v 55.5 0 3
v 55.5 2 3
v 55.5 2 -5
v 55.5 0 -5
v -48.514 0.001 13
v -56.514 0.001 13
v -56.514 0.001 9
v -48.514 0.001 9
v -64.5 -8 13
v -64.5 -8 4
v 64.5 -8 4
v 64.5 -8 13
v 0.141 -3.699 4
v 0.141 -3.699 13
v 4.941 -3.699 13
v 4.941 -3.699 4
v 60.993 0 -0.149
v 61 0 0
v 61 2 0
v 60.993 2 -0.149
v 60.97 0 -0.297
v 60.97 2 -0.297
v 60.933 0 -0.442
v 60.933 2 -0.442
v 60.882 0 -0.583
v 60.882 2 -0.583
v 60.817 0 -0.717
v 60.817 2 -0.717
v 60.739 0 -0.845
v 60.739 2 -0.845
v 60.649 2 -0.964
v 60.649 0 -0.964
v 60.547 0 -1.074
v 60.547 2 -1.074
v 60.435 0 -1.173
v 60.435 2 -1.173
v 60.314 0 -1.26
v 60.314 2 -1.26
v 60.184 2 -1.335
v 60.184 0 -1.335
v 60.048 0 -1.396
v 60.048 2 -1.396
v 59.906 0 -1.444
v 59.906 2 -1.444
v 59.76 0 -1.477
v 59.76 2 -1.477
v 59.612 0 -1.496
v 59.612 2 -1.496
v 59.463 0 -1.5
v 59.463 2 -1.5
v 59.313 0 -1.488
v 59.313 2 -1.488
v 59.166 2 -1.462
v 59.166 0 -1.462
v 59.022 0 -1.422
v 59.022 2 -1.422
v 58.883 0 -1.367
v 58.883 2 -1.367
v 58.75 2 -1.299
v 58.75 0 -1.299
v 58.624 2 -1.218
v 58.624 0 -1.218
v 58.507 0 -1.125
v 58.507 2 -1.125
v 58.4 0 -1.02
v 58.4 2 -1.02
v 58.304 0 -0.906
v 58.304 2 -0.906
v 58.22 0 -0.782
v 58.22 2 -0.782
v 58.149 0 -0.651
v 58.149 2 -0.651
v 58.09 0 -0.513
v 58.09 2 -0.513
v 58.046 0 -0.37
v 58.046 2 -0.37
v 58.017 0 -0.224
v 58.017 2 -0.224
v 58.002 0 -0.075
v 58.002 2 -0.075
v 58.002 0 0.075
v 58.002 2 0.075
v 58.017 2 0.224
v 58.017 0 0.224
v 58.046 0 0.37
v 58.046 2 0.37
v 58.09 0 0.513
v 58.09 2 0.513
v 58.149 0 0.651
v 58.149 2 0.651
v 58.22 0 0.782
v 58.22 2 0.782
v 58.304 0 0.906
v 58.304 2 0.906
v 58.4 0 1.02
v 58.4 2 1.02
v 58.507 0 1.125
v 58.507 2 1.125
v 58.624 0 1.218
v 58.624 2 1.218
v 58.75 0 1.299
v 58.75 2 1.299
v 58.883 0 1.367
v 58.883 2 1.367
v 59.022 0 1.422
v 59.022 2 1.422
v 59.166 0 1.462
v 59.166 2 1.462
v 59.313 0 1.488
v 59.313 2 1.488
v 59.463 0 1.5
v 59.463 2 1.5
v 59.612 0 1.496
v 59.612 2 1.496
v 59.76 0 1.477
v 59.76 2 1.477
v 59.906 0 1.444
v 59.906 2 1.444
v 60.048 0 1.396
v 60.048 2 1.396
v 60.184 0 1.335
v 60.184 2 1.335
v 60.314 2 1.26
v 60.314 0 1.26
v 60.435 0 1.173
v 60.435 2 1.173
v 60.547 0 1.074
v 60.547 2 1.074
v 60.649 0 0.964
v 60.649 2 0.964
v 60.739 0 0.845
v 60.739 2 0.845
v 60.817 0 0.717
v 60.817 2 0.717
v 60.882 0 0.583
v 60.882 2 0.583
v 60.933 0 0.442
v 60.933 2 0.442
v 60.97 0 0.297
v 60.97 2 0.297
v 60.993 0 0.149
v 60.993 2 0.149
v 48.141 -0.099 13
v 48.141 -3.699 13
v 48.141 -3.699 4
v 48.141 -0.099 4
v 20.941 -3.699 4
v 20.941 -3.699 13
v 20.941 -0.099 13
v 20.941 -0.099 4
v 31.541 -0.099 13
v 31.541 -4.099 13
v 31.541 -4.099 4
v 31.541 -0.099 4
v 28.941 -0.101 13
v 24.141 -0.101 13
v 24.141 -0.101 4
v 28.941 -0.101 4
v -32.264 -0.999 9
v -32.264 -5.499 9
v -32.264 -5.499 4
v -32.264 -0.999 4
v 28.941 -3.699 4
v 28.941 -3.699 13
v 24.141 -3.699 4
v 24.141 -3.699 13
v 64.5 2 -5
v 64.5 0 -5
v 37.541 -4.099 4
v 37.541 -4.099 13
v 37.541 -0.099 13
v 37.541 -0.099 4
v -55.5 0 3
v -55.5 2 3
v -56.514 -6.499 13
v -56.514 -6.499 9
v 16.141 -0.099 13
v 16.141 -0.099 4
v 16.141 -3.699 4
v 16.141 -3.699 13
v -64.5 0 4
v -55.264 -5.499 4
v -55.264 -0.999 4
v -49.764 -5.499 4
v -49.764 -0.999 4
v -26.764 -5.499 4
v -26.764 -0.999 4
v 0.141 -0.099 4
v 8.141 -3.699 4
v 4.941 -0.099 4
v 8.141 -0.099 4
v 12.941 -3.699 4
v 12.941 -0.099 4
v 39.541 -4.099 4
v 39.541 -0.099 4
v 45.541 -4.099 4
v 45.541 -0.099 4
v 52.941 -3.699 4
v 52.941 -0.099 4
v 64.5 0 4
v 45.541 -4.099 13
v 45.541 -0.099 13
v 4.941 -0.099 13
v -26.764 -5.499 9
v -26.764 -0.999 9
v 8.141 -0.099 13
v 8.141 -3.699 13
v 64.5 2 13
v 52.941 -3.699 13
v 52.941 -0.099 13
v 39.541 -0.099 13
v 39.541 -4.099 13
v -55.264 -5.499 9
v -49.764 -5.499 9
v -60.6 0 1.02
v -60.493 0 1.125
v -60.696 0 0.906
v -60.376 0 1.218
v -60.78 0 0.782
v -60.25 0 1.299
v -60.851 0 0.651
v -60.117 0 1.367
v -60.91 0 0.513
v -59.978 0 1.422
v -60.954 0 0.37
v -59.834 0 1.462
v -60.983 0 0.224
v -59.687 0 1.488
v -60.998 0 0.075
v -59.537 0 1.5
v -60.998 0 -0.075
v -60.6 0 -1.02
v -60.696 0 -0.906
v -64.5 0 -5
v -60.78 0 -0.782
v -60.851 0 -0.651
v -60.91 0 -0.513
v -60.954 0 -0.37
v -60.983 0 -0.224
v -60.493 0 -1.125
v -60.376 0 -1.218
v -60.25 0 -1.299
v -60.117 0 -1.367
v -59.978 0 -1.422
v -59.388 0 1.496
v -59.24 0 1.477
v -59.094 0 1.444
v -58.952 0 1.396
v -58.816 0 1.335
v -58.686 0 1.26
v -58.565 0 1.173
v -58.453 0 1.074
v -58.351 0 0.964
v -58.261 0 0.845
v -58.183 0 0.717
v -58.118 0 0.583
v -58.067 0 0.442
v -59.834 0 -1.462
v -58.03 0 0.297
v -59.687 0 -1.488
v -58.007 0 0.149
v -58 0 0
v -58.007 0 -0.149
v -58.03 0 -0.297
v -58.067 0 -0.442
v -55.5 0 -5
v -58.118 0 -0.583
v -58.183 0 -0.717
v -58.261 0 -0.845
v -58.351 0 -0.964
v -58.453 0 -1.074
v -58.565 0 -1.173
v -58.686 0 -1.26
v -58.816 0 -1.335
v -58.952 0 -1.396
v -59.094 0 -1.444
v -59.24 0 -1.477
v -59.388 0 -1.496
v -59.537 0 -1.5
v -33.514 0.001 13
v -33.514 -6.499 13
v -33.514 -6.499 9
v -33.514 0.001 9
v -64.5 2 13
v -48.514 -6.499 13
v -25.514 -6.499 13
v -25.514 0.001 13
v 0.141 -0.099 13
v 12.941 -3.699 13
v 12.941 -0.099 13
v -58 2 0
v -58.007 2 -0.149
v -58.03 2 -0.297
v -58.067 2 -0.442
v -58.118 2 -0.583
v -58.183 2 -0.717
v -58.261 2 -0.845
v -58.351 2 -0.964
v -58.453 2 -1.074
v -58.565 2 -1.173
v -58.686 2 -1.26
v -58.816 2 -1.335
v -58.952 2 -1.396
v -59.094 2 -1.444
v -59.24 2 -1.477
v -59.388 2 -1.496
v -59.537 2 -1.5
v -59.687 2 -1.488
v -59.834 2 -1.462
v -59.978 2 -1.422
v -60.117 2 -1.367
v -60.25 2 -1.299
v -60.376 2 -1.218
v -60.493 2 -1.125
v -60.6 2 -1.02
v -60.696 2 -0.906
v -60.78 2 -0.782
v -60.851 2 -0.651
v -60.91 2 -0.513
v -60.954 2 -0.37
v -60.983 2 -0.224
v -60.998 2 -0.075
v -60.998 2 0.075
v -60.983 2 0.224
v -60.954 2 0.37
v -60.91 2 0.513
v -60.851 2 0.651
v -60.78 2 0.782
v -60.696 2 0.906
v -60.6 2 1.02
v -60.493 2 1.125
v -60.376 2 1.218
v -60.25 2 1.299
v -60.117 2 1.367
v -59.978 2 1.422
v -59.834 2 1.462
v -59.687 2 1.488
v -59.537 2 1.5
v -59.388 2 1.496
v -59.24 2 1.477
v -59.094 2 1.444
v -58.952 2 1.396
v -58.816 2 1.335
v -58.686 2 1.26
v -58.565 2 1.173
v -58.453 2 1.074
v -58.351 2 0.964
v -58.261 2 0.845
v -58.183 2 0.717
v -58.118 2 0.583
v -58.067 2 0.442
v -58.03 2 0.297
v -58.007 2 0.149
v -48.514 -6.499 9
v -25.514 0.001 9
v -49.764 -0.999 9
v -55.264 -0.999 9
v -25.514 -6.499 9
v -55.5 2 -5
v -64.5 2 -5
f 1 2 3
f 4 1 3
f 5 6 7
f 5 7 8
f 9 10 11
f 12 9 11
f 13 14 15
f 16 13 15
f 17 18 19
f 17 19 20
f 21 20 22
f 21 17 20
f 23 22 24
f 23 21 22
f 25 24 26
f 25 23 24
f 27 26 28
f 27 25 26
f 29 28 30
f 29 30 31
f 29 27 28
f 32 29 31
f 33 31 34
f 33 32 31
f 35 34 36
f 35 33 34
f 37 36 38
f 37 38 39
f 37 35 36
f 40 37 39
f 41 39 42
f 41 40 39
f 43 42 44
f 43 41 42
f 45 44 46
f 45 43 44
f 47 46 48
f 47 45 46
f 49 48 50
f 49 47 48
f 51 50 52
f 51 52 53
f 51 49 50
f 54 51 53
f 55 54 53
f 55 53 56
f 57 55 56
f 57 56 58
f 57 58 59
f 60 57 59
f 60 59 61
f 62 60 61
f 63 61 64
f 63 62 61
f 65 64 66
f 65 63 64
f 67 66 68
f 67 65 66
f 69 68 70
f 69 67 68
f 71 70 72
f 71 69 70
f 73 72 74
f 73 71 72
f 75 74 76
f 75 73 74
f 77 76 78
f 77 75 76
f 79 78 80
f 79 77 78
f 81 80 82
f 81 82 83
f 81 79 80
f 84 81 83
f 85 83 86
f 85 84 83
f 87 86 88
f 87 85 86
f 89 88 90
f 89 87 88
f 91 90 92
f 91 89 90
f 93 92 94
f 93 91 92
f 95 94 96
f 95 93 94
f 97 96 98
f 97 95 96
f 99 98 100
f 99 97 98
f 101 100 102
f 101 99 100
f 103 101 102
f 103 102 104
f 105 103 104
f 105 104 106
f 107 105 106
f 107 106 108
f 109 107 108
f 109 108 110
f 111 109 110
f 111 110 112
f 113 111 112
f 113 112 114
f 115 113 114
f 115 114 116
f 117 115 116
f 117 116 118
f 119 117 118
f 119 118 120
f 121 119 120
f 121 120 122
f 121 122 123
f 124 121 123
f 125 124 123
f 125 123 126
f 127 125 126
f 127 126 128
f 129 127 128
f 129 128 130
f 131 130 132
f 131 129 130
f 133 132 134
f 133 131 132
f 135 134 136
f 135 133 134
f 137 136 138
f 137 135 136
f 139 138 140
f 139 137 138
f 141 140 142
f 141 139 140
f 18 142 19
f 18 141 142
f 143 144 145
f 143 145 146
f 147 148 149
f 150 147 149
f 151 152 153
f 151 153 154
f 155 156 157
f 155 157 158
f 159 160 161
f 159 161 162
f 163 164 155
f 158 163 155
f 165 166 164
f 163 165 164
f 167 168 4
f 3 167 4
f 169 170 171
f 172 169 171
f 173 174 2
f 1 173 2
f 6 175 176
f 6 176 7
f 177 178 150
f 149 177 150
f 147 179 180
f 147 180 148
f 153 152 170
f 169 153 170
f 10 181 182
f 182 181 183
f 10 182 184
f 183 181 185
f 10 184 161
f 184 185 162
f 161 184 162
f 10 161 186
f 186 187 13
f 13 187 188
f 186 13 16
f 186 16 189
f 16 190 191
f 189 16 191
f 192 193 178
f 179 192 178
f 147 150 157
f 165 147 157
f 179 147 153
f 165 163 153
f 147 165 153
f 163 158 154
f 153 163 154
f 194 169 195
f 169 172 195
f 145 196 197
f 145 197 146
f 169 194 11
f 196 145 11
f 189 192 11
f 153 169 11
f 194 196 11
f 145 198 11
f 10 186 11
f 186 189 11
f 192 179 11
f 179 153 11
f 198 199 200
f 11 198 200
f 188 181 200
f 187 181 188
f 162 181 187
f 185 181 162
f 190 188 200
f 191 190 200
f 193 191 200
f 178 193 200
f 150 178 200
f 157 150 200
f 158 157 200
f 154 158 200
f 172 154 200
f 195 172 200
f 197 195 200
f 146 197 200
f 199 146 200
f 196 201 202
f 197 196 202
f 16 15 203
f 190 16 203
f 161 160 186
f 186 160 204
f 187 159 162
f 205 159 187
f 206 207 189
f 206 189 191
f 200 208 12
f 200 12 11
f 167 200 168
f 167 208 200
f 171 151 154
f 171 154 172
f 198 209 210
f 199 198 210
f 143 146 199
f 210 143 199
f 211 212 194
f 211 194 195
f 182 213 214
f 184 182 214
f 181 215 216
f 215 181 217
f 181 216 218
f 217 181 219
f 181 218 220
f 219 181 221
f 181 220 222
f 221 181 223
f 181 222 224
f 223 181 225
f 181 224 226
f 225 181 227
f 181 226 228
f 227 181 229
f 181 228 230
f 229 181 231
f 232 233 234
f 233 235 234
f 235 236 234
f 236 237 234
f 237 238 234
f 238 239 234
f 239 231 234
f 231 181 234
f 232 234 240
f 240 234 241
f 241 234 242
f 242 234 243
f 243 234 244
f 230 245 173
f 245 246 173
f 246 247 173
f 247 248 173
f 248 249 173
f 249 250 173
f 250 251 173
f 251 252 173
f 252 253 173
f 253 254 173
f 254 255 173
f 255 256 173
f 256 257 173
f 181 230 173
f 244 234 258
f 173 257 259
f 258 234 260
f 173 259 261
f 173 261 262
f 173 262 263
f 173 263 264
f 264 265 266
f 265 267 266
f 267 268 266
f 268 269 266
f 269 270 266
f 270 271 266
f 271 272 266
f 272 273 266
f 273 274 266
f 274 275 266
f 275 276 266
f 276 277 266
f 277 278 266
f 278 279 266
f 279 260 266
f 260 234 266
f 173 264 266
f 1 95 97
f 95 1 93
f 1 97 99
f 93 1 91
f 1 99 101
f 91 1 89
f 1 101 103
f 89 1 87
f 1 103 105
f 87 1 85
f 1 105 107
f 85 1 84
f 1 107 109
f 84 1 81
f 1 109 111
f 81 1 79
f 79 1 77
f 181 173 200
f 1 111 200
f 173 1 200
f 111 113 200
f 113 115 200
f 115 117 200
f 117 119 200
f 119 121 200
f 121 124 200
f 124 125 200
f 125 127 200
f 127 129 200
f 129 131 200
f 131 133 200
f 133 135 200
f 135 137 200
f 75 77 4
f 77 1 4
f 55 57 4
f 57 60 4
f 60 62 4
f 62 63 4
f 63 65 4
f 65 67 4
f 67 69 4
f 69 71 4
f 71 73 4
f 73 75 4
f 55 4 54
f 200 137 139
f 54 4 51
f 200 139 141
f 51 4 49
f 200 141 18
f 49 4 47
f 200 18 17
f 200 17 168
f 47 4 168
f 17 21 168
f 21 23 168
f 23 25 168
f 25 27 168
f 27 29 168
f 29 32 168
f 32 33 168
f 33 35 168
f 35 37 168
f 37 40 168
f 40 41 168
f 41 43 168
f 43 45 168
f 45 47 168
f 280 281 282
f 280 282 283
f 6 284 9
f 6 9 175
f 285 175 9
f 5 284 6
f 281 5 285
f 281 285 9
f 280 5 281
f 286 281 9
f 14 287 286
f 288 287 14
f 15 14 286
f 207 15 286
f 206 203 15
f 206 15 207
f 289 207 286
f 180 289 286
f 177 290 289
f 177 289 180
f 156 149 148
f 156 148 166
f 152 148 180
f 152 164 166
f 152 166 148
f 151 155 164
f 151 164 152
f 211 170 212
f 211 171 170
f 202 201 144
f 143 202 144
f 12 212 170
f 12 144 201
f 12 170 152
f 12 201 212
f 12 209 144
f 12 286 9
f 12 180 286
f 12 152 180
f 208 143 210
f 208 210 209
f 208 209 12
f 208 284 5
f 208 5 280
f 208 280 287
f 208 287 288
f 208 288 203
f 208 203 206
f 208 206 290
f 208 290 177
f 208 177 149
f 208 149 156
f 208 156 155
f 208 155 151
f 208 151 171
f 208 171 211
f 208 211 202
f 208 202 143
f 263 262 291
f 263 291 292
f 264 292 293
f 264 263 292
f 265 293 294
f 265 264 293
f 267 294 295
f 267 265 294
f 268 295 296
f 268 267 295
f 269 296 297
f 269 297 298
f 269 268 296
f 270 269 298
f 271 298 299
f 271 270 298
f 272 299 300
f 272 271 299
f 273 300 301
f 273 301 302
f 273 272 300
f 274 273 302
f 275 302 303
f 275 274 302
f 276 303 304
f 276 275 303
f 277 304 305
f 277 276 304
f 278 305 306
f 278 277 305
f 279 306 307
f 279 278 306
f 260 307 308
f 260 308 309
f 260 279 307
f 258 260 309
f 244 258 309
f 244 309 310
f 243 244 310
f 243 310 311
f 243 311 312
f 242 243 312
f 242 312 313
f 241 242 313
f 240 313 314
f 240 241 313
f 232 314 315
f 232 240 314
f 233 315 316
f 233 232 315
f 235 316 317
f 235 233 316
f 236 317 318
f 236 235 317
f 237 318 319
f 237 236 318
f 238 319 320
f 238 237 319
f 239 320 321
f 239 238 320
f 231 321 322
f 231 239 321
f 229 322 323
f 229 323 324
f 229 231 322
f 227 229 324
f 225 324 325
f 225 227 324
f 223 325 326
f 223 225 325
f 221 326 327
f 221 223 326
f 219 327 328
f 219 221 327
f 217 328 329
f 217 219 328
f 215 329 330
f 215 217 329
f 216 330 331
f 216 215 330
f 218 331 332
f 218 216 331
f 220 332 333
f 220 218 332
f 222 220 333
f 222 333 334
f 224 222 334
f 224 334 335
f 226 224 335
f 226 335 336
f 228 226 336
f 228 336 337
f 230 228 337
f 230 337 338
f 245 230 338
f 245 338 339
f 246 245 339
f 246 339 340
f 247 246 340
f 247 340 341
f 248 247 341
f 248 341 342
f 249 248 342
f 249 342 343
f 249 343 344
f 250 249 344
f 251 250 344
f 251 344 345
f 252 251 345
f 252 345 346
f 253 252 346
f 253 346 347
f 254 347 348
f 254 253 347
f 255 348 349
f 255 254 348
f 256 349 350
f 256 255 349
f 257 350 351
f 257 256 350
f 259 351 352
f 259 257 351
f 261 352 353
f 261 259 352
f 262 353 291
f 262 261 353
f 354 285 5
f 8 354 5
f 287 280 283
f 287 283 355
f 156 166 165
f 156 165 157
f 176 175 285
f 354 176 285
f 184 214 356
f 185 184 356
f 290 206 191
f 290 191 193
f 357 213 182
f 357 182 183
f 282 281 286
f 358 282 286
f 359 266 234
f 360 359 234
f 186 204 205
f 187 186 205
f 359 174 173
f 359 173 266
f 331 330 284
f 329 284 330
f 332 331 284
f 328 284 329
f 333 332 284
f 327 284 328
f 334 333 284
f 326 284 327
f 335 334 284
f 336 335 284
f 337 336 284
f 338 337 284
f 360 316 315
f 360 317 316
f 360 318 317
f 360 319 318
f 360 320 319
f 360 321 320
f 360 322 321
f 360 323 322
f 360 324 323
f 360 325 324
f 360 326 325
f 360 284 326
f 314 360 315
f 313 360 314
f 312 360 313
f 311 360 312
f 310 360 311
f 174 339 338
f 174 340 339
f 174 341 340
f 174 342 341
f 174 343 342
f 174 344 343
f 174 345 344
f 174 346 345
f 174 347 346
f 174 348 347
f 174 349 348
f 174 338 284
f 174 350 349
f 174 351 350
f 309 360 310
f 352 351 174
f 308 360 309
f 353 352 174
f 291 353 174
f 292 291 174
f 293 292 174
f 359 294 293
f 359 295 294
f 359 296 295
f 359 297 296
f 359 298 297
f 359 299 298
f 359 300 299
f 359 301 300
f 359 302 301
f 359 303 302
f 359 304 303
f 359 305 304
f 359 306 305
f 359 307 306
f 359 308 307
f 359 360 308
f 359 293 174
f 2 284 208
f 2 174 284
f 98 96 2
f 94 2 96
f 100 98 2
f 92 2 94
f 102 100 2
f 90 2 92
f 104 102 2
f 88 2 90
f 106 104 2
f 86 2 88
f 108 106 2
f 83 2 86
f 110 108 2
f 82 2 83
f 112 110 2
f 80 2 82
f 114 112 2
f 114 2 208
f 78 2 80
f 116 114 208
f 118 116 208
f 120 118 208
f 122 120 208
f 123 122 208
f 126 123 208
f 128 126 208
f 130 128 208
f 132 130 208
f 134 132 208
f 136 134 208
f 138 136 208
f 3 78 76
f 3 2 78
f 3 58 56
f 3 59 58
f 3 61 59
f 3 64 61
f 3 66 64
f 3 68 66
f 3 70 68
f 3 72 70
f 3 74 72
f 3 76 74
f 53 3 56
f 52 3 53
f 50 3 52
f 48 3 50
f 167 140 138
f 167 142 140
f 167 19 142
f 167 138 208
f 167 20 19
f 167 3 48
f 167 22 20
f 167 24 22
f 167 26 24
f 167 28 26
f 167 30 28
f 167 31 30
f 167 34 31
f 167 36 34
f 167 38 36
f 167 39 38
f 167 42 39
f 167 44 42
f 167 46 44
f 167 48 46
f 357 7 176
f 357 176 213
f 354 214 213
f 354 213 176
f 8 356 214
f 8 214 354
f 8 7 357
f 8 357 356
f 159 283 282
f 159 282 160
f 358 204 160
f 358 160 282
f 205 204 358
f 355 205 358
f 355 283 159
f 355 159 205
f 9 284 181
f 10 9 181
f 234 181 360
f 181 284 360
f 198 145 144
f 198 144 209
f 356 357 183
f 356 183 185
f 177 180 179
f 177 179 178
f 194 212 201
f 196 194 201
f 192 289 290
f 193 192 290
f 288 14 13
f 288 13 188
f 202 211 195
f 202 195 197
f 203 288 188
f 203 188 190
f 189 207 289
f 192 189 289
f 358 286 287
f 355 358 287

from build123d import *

# Parameters (mm, degrees)
SKETCH3_R           = 1.5
BOSS_EXTRUDE4_DEPTH = 2
SKETCH8_W           = 129
SKETCH8_H           = 9
BOSS_EXTRUDE5_DEPTH = 10
SKETCH10_W          = 5.5
SKETCH10_H          = 4.5
SKETCH10_W_2        = 4.80000148
SKETCH10_H_2        = 3.5999988
SKETCH10_H_3        = 3.597941299
SKETCH10_W_3        = 5.99999908
SKETCH10_H_4        = 4.00000054
CUT_EXTRUDE1_DEPTH  = 18
SKETCH11_W          = 8
SKETCH11_H          = 6.5
CUT_EXTRUDE2_DEPTH  = 4
SKETCH12_W          = 111
SKETCH12_H          = 8
CUT_EXTRUDE3_DEPTH  = 10


with BuildPart() as part:
    # Sketch3 → Boss-Extrude4 (new body)
    with BuildSketch(Plane(origin=(0, 0, 0), x_dir=(1, 0, 0), z_dir=(0, 1, 0))):
        Polygon((-64.5, -13), (64.5, -13), (64.5, 5), (54.5, 5), (54.5, -3), (-54.5, -3), (-54.5, 5), (-64.5, 5), align=None)
        with Locations((-59.5, 0)):
            Circle(SKETCH3_R, mode=Mode.SUBTRACT)
        with Locations((59.5, 0)):
            Circle(SKETCH3_R, mode=Mode.SUBTRACT)
    extrude(amount=BOSS_EXTRUDE4_DEPTH)

    # Sketch8 → Boss-Extrude5 (add)
    with BuildSketch(Plane(origin=(0, 2, 0), x_dir=(1, 0, 0), z_dir=(0, 1, 0))):
        with Locations((0, -8.5)):
            Rectangle(SKETCH8_W, SKETCH8_H)
    extrude(amount=-BOSS_EXTRUDE5_DEPTH)

    # Sketch10 → Cut-Extrude1 (cut)
    with BuildSketch(Plane.XY.offset(13)):
        with Locations((-52.513655094, -3.248549409)):
            Rectangle(SKETCH10_W, SKETCH10_H)
        with Locations((-29.513655374, -3.248549409)):
            Rectangle(SKETCH10_W, SKETCH10_H)
        with Locations((2.541347826, -1.898548299)):
            Rectangle(SKETCH10_W_2, SKETCH10_H_2)
        with Locations((10.541347066, -1.898548299)):
            Rectangle(SKETCH10_W_2, SKETCH10_H_2)
        with Locations((18.541346306, -1.898548299)):
            Rectangle(SKETCH10_W_2, SKETCH10_H_2)
        with Locations((26.541345546, -1.89957705)):
            Rectangle(SKETCH10_W_2, SKETCH10_H_3)
        with Locations((34.541344786, -2.098549169)):
            Rectangle(SKETCH10_W_3, SKETCH10_H_4)
        with Locations((42.541344026, -2.098549169)):
            Rectangle(SKETCH10_W_3, SKETCH10_H_4)
        with Locations((50.541343266, -1.898548299)):
            Rectangle(SKETCH10_W_2, SKETCH10_H_2)
    extrude(amount=-CUT_EXTRUDE1_DEPTH, mode=Mode.SUBTRACT)

    # Sketch11 → Cut-Extrude2 (cut)
    with BuildSketch(Plane.XY.offset(13)):
        with Locations((-52.513655094, -3.248549409)):
            Rectangle(SKETCH11_W, SKETCH11_H)
        with Locations((-29.513655374, -3.248549409)):
            Rectangle(SKETCH11_W, SKETCH11_H)
    extrude(amount=-CUT_EXTRUDE2_DEPTH, mode=Mode.SUBTRACT)

    # Sketch12 → Cut-Extrude3 (cut)
    with BuildSketch(Plane(origin=(0, 2, 0), x_dir=(1, 0, 0), z_dir=(0, 1, 0))):
        with Locations((0, 1)):
            Rectangle(SKETCH12_W, SKETCH12_H)
    extrude(amount=-CUT_EXTRUDE3_DEPTH, mode=Mode.SUBTRACT)


solid = part.part
